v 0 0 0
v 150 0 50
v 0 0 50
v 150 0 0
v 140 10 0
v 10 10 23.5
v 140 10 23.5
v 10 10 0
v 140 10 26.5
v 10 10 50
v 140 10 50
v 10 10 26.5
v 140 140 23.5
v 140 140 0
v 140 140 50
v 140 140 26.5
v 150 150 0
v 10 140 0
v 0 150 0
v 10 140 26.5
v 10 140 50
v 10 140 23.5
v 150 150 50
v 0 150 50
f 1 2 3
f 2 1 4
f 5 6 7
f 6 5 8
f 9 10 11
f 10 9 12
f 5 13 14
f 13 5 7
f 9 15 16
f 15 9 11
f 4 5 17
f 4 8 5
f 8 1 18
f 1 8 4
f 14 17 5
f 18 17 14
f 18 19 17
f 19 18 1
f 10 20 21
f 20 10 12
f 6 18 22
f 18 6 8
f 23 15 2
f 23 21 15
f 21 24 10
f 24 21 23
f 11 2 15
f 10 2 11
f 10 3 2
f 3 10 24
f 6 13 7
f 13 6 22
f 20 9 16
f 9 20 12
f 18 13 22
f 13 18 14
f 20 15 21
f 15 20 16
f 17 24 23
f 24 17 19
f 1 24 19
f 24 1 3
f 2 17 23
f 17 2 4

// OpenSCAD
// file: ../BoxPaneFrame.scad
DEFAULT_SIZE = [150, 200, 30];
DEFAULT_PANE_THICKNESS = 3;
DEFAULT_BOX_THICKNESS = 6;
DEFAULT_CORNER_SPACING = 10;

BOX_COLOUR = "Brown";
PANEL_COLOUR = "grey";
PANEL_ALPHA = 0.25;

module BoxColour() { color(BOX_COLOUR) children(); }
module PanelColour() { color(PANEL_COLOUR, PANEL_ALPHA) children(); }

module BoxPaneFrameSide2D(sizeX, sizeY, slotThickness, cornerSpacing)
{
    difference()
    {
        square([sizeX, sizeY]);

        translate([(sizeX - slotThickness) / 2, cornerSpacing])
        square([slotThickness, sizeY - cornerSpacing * 2]);
    }
}

module BoxPaneFrameSideX2D(size, panelThickness, cornerSpacing, boxThickness)
{
    BoxPaneFrameSide2D(size[2], size[0] - boxThickness * 2, panelThickness, cornerSpacing);
}

module BoxPaneFrameSideY2D(size, panelThickness, cornerSpacing)
{
    BoxPaneFrameSide2D(size[2], size[1], panelThickness, cornerSpacing);
}

module BoxPaneFramePane2D(
    size = DEFAULT_SIZE,
    cornerSpacing = DEFAULT_CORNER_SPACING,
    boxThickness = DEFAULT_BOX_THICKNESS)
{
    posX1 = 0;
    posX2 = size[0] - cornerSpacing - boxThickness;
    posY1 = 0;
    posY2 = size[1] - cornerSpacing;

    difference()
    {
        square([size[0], size[1]]);

        translate([posX1, posY1]) square([cornerSpacing + boxThickness, cornerSpacing]);
        translate([posX1, posY2]) square([cornerSpacing + boxThickness, cornerSpacing]);
        translate([posX2, posY1]) square([cornerSpacing + boxThickness, cornerSpacing]);
        translate([posX2, posY2]) square([cornerSpacing + boxThickness, cornerSpacing]);
    }
}

module BoxPaneFrameBox2D(
    size = DEFAULT_SIZE,
    panelThickness = DEFAULT_PANE_THICKNESS,
    cornerSpacing = DEFAULT_CORNER_SPACING,
    boxThickness = DEFAULT_BOX_THICKNESS)
{
    buffer = 0.25;

    posX1 = buffer;
    posX2 = buffer + size[2];
    posY1 = 0;
    posY2 = buffer + size[0] - boxThickness * 2;

    BoxColour()
    {
        translate([posX1, posY1]) BoxPaneFrameSideX2D(size, panelThickness, cornerSpacing, boxThickness);
        translate([posX2, posY1]) BoxPaneFrameSideX2D(size, panelThickness, cornerSpacing, boxThickness);
        translate([posX1, posY2]) BoxPaneFrameSideY2D(size, panelThickness, cornerSpacing);
        translate([posX2, posY2]) BoxPaneFrameSideY2D(size, panelThickness, cornerSpacing);
    }
}

module BoxPaneFrame2D(
    size = DEFAULT_SIZE,
    panelThickness = DEFAULT_PANE_THICKNESS,
    cornerSpacing = DEFAULT_CORNER_SPACING,
    boxThickness = DEFAULT_BOX_THICKNESS)
{
    BoxPaneFrameBox2D(size, panelThickness, cornerSpacing, boxThickness);

    PanelColour()
    translate([-size[0], 0])
    BoxPaneFramePane2D(size[0], size[1], cornerSpacing, boxThickness);
}

module BoxPaneFrame3D(
    size = DEFAULT_SIZE,
    panelThickness = DEFAULT_PANE_THICKNESS,
    cornerSpacing = DEFAULT_CORNER_SPACING,
    boxThickness = DEFAULT_BOX_THICKNESS)
{
    BoxColour()
    {
        translate([boxThickness, 0, 0])
        rotate([0, 270, 270])
        linear_extrude(boxThickness)
        BoxPaneFrameSideX2D(size, panelThickness, cornerSpacing, boxThickness);

        translate([boxThickness, size[1] - boxThickness, 0])
        rotate([0, 270, 270])
        linear_extrude(boxThickness)
        BoxPaneFrameSideX2D(size, panelThickness, cornerSpacing, boxThickness);

        translate([boxThickness, 0, 0])
        rotate([0, 270, 0])
        linear_extrude(boxThickness)
        BoxPaneFrameSideY2D(size, panelThickness, cornerSpacing);

        translate([size[0], 0, 0])
        rotate([0, 270, 0])
        linear_extrude(boxThickness)
        BoxPaneFrameSideY2D(size, panelThickness, cornerSpacing);
    }

    PanelColour()
    translate([0, 0, (size[2] - panelThickness) / 2])
    linear_extrude(panelThickness)
    BoxPaneFramePane2D(size, cornerSpacing, boxThickness);
}
// main file
use <../BoxPaneFrame.scad>

SIZE = [150, 150, 50];
PANE_THICKNESS = 3;
CORNER_SPACING = 6;
BOX_THICKNESS = 10;

BoxPaneFrame3D(SIZE, PANE_THICKNESS, CORNER_SPACING, BOX_THICKNESS);
